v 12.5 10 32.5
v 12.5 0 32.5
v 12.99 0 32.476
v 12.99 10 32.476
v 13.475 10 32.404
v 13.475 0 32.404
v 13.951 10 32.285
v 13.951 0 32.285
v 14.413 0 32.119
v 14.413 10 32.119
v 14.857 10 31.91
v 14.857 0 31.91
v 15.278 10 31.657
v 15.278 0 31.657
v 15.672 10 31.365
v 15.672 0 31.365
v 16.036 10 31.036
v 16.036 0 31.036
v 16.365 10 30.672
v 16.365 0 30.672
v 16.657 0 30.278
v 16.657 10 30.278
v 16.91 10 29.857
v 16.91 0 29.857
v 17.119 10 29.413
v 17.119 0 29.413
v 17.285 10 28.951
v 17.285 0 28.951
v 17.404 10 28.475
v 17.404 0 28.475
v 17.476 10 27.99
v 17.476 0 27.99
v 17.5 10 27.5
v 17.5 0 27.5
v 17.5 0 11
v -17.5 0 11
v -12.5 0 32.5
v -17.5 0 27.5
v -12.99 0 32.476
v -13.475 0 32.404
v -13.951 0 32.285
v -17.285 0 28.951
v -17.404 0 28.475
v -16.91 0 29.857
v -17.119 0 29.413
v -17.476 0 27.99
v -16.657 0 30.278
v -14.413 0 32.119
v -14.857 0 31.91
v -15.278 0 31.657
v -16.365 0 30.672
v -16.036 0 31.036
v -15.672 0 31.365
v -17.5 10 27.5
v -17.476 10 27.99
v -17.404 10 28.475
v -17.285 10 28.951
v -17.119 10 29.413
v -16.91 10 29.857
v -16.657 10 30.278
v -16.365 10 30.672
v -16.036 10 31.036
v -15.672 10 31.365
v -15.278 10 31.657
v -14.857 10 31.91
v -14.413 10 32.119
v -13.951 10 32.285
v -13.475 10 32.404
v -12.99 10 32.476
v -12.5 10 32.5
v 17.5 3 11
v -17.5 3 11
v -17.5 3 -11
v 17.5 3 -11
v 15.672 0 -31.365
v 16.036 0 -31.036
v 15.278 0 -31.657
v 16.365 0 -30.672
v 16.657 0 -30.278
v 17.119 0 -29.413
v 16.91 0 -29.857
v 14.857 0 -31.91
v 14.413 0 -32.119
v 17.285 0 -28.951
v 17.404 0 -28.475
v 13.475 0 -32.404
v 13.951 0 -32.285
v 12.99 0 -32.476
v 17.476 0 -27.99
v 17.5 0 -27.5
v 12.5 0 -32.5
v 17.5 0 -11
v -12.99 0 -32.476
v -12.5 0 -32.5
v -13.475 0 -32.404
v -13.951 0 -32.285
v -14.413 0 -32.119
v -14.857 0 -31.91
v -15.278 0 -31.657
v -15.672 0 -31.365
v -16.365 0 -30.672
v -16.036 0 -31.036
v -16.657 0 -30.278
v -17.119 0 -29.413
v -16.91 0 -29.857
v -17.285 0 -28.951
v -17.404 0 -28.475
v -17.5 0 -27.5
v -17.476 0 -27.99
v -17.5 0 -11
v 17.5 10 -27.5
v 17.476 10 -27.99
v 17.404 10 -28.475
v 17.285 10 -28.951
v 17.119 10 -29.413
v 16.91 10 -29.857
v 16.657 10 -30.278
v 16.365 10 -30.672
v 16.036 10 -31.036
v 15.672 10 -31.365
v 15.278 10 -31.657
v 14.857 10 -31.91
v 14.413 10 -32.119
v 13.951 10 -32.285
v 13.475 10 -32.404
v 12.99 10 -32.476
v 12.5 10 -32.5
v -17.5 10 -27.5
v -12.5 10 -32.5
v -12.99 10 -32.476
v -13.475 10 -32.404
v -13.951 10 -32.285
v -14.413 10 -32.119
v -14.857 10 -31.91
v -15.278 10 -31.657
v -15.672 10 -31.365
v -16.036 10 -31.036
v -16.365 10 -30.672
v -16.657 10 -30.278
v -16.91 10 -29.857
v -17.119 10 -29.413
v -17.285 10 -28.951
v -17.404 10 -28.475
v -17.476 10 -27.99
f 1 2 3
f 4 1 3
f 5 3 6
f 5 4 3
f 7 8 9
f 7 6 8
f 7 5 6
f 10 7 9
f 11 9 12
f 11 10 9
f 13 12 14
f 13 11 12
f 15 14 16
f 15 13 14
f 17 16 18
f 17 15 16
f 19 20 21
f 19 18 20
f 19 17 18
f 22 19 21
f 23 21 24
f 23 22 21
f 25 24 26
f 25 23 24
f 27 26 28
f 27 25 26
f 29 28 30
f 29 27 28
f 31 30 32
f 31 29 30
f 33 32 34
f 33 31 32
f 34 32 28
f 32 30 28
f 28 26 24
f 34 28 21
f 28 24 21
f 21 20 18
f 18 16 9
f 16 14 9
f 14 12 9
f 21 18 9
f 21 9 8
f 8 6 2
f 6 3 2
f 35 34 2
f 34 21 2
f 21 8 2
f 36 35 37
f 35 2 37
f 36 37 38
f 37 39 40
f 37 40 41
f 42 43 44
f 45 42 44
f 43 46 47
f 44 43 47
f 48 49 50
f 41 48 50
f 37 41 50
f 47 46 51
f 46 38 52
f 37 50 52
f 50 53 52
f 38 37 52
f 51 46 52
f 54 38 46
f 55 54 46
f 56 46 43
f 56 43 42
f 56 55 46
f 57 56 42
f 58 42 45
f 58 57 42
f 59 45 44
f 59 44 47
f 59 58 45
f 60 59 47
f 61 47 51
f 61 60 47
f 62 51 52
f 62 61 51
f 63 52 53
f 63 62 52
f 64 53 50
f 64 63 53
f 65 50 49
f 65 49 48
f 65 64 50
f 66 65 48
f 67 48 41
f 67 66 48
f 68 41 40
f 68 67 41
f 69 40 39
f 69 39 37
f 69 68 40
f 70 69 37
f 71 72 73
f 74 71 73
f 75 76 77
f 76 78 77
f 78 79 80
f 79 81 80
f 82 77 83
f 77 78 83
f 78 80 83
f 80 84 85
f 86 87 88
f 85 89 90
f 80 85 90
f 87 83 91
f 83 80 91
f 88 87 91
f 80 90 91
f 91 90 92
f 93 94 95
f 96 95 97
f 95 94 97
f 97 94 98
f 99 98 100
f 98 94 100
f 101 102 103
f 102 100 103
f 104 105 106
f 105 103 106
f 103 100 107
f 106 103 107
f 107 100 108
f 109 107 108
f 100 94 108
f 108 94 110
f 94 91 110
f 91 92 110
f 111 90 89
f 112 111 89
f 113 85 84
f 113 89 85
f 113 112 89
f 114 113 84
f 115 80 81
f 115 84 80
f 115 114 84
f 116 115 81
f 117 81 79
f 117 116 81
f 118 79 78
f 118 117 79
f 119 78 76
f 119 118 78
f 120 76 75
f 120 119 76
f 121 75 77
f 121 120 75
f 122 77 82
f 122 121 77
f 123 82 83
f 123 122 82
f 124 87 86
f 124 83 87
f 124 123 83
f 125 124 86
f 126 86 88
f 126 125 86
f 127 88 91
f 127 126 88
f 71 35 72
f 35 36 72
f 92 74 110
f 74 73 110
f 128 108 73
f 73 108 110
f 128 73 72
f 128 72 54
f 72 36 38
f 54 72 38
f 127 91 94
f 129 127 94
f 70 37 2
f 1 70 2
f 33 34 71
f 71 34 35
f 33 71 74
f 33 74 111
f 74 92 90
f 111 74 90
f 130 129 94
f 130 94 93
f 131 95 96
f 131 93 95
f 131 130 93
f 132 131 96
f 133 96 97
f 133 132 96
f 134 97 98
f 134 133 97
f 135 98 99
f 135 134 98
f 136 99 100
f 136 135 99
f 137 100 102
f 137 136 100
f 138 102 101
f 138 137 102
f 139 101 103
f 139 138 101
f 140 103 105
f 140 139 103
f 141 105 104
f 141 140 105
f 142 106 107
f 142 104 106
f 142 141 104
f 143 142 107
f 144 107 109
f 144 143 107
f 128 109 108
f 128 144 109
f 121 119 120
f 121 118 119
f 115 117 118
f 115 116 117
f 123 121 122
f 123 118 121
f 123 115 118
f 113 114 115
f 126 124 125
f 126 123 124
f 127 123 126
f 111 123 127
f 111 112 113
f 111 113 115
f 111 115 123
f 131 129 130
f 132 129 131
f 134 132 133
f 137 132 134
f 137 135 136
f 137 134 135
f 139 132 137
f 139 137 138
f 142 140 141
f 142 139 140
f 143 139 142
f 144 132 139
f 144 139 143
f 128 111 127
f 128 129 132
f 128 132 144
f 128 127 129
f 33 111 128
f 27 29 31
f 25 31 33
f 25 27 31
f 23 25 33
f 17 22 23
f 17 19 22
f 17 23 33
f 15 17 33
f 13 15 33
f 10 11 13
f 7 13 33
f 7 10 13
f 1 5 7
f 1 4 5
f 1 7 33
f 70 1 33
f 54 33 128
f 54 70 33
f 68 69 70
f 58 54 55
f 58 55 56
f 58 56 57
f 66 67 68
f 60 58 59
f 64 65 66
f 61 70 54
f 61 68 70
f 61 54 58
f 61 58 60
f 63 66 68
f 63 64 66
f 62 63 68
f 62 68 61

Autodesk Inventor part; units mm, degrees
ref_plane "YZ Plane" through (0, 0, 0) normal (1, 0, 0) x (0, 1, 0)
ref_plane "XZ Plane" through (0, 0, 0) normal (0, 1, 0) x (-1, 0, 0)
ref_plane "XY Plane" through (0, 0, 0) normal (0, 0, 1) x (1, 0, 0)
sketch "Esboço1" plane through (0, 0, 0) normal (0, 1, 0) x (-1, 0, 0)
  line L0 (17.5, 32.5) -> (-17.5, 32.5)
  line L1 (-17.5, 32.5) -> (-17.5, -32.5)
  line L2 (-17.5, -32.5) -> (17.5, -32.5)
  line L3 (17.5, -32.5) -> (17.5, 32.5)
  line L4 (17.5, 32.5) -> (-17.5, -32.5) construction
  line L5 (-17.5, 32.5) -> (17.5, -32.5) construction
  point P0 (0, 0)
  dimension "d0" = 35
  dimension "d1" = 65
extrude "Extrusão1" add sketch "Esboço1" along normal blind 10
fillet "Arredondamento1" radius 5 4 edges at (17.5, 5, 32.5) (-17.5, 5, 32.5) (17.5, 5, -32.5) (-17.5, 5, -32.5)
sketch "Esboço2" plane through (-17.5, 0, -27.5) normal (-1, 0, 0) x (0, 0, 1)
  line L0 (16.5, -3) -> (38.5, -3)
  line L1 (38.5, -3) -> (38.5, 3)
  line L2 (38.5, 3) -> (16.5, 3)
  line L3 (16.5, 3) -> (16.5, -3)
  line L4 (16.5, -3) -> (38.5, 3) construction
  line L5 (38.5, -3) -> (16.5, 3) construction
  point P0 (27.5, 0)
  dimension "d5" = 22
  dimension "d6" = 6
extrude "Extrusão2" cut sketch "Esboço2" against normal up to surface (35 mm away)
properties part number "ESC BASE"
